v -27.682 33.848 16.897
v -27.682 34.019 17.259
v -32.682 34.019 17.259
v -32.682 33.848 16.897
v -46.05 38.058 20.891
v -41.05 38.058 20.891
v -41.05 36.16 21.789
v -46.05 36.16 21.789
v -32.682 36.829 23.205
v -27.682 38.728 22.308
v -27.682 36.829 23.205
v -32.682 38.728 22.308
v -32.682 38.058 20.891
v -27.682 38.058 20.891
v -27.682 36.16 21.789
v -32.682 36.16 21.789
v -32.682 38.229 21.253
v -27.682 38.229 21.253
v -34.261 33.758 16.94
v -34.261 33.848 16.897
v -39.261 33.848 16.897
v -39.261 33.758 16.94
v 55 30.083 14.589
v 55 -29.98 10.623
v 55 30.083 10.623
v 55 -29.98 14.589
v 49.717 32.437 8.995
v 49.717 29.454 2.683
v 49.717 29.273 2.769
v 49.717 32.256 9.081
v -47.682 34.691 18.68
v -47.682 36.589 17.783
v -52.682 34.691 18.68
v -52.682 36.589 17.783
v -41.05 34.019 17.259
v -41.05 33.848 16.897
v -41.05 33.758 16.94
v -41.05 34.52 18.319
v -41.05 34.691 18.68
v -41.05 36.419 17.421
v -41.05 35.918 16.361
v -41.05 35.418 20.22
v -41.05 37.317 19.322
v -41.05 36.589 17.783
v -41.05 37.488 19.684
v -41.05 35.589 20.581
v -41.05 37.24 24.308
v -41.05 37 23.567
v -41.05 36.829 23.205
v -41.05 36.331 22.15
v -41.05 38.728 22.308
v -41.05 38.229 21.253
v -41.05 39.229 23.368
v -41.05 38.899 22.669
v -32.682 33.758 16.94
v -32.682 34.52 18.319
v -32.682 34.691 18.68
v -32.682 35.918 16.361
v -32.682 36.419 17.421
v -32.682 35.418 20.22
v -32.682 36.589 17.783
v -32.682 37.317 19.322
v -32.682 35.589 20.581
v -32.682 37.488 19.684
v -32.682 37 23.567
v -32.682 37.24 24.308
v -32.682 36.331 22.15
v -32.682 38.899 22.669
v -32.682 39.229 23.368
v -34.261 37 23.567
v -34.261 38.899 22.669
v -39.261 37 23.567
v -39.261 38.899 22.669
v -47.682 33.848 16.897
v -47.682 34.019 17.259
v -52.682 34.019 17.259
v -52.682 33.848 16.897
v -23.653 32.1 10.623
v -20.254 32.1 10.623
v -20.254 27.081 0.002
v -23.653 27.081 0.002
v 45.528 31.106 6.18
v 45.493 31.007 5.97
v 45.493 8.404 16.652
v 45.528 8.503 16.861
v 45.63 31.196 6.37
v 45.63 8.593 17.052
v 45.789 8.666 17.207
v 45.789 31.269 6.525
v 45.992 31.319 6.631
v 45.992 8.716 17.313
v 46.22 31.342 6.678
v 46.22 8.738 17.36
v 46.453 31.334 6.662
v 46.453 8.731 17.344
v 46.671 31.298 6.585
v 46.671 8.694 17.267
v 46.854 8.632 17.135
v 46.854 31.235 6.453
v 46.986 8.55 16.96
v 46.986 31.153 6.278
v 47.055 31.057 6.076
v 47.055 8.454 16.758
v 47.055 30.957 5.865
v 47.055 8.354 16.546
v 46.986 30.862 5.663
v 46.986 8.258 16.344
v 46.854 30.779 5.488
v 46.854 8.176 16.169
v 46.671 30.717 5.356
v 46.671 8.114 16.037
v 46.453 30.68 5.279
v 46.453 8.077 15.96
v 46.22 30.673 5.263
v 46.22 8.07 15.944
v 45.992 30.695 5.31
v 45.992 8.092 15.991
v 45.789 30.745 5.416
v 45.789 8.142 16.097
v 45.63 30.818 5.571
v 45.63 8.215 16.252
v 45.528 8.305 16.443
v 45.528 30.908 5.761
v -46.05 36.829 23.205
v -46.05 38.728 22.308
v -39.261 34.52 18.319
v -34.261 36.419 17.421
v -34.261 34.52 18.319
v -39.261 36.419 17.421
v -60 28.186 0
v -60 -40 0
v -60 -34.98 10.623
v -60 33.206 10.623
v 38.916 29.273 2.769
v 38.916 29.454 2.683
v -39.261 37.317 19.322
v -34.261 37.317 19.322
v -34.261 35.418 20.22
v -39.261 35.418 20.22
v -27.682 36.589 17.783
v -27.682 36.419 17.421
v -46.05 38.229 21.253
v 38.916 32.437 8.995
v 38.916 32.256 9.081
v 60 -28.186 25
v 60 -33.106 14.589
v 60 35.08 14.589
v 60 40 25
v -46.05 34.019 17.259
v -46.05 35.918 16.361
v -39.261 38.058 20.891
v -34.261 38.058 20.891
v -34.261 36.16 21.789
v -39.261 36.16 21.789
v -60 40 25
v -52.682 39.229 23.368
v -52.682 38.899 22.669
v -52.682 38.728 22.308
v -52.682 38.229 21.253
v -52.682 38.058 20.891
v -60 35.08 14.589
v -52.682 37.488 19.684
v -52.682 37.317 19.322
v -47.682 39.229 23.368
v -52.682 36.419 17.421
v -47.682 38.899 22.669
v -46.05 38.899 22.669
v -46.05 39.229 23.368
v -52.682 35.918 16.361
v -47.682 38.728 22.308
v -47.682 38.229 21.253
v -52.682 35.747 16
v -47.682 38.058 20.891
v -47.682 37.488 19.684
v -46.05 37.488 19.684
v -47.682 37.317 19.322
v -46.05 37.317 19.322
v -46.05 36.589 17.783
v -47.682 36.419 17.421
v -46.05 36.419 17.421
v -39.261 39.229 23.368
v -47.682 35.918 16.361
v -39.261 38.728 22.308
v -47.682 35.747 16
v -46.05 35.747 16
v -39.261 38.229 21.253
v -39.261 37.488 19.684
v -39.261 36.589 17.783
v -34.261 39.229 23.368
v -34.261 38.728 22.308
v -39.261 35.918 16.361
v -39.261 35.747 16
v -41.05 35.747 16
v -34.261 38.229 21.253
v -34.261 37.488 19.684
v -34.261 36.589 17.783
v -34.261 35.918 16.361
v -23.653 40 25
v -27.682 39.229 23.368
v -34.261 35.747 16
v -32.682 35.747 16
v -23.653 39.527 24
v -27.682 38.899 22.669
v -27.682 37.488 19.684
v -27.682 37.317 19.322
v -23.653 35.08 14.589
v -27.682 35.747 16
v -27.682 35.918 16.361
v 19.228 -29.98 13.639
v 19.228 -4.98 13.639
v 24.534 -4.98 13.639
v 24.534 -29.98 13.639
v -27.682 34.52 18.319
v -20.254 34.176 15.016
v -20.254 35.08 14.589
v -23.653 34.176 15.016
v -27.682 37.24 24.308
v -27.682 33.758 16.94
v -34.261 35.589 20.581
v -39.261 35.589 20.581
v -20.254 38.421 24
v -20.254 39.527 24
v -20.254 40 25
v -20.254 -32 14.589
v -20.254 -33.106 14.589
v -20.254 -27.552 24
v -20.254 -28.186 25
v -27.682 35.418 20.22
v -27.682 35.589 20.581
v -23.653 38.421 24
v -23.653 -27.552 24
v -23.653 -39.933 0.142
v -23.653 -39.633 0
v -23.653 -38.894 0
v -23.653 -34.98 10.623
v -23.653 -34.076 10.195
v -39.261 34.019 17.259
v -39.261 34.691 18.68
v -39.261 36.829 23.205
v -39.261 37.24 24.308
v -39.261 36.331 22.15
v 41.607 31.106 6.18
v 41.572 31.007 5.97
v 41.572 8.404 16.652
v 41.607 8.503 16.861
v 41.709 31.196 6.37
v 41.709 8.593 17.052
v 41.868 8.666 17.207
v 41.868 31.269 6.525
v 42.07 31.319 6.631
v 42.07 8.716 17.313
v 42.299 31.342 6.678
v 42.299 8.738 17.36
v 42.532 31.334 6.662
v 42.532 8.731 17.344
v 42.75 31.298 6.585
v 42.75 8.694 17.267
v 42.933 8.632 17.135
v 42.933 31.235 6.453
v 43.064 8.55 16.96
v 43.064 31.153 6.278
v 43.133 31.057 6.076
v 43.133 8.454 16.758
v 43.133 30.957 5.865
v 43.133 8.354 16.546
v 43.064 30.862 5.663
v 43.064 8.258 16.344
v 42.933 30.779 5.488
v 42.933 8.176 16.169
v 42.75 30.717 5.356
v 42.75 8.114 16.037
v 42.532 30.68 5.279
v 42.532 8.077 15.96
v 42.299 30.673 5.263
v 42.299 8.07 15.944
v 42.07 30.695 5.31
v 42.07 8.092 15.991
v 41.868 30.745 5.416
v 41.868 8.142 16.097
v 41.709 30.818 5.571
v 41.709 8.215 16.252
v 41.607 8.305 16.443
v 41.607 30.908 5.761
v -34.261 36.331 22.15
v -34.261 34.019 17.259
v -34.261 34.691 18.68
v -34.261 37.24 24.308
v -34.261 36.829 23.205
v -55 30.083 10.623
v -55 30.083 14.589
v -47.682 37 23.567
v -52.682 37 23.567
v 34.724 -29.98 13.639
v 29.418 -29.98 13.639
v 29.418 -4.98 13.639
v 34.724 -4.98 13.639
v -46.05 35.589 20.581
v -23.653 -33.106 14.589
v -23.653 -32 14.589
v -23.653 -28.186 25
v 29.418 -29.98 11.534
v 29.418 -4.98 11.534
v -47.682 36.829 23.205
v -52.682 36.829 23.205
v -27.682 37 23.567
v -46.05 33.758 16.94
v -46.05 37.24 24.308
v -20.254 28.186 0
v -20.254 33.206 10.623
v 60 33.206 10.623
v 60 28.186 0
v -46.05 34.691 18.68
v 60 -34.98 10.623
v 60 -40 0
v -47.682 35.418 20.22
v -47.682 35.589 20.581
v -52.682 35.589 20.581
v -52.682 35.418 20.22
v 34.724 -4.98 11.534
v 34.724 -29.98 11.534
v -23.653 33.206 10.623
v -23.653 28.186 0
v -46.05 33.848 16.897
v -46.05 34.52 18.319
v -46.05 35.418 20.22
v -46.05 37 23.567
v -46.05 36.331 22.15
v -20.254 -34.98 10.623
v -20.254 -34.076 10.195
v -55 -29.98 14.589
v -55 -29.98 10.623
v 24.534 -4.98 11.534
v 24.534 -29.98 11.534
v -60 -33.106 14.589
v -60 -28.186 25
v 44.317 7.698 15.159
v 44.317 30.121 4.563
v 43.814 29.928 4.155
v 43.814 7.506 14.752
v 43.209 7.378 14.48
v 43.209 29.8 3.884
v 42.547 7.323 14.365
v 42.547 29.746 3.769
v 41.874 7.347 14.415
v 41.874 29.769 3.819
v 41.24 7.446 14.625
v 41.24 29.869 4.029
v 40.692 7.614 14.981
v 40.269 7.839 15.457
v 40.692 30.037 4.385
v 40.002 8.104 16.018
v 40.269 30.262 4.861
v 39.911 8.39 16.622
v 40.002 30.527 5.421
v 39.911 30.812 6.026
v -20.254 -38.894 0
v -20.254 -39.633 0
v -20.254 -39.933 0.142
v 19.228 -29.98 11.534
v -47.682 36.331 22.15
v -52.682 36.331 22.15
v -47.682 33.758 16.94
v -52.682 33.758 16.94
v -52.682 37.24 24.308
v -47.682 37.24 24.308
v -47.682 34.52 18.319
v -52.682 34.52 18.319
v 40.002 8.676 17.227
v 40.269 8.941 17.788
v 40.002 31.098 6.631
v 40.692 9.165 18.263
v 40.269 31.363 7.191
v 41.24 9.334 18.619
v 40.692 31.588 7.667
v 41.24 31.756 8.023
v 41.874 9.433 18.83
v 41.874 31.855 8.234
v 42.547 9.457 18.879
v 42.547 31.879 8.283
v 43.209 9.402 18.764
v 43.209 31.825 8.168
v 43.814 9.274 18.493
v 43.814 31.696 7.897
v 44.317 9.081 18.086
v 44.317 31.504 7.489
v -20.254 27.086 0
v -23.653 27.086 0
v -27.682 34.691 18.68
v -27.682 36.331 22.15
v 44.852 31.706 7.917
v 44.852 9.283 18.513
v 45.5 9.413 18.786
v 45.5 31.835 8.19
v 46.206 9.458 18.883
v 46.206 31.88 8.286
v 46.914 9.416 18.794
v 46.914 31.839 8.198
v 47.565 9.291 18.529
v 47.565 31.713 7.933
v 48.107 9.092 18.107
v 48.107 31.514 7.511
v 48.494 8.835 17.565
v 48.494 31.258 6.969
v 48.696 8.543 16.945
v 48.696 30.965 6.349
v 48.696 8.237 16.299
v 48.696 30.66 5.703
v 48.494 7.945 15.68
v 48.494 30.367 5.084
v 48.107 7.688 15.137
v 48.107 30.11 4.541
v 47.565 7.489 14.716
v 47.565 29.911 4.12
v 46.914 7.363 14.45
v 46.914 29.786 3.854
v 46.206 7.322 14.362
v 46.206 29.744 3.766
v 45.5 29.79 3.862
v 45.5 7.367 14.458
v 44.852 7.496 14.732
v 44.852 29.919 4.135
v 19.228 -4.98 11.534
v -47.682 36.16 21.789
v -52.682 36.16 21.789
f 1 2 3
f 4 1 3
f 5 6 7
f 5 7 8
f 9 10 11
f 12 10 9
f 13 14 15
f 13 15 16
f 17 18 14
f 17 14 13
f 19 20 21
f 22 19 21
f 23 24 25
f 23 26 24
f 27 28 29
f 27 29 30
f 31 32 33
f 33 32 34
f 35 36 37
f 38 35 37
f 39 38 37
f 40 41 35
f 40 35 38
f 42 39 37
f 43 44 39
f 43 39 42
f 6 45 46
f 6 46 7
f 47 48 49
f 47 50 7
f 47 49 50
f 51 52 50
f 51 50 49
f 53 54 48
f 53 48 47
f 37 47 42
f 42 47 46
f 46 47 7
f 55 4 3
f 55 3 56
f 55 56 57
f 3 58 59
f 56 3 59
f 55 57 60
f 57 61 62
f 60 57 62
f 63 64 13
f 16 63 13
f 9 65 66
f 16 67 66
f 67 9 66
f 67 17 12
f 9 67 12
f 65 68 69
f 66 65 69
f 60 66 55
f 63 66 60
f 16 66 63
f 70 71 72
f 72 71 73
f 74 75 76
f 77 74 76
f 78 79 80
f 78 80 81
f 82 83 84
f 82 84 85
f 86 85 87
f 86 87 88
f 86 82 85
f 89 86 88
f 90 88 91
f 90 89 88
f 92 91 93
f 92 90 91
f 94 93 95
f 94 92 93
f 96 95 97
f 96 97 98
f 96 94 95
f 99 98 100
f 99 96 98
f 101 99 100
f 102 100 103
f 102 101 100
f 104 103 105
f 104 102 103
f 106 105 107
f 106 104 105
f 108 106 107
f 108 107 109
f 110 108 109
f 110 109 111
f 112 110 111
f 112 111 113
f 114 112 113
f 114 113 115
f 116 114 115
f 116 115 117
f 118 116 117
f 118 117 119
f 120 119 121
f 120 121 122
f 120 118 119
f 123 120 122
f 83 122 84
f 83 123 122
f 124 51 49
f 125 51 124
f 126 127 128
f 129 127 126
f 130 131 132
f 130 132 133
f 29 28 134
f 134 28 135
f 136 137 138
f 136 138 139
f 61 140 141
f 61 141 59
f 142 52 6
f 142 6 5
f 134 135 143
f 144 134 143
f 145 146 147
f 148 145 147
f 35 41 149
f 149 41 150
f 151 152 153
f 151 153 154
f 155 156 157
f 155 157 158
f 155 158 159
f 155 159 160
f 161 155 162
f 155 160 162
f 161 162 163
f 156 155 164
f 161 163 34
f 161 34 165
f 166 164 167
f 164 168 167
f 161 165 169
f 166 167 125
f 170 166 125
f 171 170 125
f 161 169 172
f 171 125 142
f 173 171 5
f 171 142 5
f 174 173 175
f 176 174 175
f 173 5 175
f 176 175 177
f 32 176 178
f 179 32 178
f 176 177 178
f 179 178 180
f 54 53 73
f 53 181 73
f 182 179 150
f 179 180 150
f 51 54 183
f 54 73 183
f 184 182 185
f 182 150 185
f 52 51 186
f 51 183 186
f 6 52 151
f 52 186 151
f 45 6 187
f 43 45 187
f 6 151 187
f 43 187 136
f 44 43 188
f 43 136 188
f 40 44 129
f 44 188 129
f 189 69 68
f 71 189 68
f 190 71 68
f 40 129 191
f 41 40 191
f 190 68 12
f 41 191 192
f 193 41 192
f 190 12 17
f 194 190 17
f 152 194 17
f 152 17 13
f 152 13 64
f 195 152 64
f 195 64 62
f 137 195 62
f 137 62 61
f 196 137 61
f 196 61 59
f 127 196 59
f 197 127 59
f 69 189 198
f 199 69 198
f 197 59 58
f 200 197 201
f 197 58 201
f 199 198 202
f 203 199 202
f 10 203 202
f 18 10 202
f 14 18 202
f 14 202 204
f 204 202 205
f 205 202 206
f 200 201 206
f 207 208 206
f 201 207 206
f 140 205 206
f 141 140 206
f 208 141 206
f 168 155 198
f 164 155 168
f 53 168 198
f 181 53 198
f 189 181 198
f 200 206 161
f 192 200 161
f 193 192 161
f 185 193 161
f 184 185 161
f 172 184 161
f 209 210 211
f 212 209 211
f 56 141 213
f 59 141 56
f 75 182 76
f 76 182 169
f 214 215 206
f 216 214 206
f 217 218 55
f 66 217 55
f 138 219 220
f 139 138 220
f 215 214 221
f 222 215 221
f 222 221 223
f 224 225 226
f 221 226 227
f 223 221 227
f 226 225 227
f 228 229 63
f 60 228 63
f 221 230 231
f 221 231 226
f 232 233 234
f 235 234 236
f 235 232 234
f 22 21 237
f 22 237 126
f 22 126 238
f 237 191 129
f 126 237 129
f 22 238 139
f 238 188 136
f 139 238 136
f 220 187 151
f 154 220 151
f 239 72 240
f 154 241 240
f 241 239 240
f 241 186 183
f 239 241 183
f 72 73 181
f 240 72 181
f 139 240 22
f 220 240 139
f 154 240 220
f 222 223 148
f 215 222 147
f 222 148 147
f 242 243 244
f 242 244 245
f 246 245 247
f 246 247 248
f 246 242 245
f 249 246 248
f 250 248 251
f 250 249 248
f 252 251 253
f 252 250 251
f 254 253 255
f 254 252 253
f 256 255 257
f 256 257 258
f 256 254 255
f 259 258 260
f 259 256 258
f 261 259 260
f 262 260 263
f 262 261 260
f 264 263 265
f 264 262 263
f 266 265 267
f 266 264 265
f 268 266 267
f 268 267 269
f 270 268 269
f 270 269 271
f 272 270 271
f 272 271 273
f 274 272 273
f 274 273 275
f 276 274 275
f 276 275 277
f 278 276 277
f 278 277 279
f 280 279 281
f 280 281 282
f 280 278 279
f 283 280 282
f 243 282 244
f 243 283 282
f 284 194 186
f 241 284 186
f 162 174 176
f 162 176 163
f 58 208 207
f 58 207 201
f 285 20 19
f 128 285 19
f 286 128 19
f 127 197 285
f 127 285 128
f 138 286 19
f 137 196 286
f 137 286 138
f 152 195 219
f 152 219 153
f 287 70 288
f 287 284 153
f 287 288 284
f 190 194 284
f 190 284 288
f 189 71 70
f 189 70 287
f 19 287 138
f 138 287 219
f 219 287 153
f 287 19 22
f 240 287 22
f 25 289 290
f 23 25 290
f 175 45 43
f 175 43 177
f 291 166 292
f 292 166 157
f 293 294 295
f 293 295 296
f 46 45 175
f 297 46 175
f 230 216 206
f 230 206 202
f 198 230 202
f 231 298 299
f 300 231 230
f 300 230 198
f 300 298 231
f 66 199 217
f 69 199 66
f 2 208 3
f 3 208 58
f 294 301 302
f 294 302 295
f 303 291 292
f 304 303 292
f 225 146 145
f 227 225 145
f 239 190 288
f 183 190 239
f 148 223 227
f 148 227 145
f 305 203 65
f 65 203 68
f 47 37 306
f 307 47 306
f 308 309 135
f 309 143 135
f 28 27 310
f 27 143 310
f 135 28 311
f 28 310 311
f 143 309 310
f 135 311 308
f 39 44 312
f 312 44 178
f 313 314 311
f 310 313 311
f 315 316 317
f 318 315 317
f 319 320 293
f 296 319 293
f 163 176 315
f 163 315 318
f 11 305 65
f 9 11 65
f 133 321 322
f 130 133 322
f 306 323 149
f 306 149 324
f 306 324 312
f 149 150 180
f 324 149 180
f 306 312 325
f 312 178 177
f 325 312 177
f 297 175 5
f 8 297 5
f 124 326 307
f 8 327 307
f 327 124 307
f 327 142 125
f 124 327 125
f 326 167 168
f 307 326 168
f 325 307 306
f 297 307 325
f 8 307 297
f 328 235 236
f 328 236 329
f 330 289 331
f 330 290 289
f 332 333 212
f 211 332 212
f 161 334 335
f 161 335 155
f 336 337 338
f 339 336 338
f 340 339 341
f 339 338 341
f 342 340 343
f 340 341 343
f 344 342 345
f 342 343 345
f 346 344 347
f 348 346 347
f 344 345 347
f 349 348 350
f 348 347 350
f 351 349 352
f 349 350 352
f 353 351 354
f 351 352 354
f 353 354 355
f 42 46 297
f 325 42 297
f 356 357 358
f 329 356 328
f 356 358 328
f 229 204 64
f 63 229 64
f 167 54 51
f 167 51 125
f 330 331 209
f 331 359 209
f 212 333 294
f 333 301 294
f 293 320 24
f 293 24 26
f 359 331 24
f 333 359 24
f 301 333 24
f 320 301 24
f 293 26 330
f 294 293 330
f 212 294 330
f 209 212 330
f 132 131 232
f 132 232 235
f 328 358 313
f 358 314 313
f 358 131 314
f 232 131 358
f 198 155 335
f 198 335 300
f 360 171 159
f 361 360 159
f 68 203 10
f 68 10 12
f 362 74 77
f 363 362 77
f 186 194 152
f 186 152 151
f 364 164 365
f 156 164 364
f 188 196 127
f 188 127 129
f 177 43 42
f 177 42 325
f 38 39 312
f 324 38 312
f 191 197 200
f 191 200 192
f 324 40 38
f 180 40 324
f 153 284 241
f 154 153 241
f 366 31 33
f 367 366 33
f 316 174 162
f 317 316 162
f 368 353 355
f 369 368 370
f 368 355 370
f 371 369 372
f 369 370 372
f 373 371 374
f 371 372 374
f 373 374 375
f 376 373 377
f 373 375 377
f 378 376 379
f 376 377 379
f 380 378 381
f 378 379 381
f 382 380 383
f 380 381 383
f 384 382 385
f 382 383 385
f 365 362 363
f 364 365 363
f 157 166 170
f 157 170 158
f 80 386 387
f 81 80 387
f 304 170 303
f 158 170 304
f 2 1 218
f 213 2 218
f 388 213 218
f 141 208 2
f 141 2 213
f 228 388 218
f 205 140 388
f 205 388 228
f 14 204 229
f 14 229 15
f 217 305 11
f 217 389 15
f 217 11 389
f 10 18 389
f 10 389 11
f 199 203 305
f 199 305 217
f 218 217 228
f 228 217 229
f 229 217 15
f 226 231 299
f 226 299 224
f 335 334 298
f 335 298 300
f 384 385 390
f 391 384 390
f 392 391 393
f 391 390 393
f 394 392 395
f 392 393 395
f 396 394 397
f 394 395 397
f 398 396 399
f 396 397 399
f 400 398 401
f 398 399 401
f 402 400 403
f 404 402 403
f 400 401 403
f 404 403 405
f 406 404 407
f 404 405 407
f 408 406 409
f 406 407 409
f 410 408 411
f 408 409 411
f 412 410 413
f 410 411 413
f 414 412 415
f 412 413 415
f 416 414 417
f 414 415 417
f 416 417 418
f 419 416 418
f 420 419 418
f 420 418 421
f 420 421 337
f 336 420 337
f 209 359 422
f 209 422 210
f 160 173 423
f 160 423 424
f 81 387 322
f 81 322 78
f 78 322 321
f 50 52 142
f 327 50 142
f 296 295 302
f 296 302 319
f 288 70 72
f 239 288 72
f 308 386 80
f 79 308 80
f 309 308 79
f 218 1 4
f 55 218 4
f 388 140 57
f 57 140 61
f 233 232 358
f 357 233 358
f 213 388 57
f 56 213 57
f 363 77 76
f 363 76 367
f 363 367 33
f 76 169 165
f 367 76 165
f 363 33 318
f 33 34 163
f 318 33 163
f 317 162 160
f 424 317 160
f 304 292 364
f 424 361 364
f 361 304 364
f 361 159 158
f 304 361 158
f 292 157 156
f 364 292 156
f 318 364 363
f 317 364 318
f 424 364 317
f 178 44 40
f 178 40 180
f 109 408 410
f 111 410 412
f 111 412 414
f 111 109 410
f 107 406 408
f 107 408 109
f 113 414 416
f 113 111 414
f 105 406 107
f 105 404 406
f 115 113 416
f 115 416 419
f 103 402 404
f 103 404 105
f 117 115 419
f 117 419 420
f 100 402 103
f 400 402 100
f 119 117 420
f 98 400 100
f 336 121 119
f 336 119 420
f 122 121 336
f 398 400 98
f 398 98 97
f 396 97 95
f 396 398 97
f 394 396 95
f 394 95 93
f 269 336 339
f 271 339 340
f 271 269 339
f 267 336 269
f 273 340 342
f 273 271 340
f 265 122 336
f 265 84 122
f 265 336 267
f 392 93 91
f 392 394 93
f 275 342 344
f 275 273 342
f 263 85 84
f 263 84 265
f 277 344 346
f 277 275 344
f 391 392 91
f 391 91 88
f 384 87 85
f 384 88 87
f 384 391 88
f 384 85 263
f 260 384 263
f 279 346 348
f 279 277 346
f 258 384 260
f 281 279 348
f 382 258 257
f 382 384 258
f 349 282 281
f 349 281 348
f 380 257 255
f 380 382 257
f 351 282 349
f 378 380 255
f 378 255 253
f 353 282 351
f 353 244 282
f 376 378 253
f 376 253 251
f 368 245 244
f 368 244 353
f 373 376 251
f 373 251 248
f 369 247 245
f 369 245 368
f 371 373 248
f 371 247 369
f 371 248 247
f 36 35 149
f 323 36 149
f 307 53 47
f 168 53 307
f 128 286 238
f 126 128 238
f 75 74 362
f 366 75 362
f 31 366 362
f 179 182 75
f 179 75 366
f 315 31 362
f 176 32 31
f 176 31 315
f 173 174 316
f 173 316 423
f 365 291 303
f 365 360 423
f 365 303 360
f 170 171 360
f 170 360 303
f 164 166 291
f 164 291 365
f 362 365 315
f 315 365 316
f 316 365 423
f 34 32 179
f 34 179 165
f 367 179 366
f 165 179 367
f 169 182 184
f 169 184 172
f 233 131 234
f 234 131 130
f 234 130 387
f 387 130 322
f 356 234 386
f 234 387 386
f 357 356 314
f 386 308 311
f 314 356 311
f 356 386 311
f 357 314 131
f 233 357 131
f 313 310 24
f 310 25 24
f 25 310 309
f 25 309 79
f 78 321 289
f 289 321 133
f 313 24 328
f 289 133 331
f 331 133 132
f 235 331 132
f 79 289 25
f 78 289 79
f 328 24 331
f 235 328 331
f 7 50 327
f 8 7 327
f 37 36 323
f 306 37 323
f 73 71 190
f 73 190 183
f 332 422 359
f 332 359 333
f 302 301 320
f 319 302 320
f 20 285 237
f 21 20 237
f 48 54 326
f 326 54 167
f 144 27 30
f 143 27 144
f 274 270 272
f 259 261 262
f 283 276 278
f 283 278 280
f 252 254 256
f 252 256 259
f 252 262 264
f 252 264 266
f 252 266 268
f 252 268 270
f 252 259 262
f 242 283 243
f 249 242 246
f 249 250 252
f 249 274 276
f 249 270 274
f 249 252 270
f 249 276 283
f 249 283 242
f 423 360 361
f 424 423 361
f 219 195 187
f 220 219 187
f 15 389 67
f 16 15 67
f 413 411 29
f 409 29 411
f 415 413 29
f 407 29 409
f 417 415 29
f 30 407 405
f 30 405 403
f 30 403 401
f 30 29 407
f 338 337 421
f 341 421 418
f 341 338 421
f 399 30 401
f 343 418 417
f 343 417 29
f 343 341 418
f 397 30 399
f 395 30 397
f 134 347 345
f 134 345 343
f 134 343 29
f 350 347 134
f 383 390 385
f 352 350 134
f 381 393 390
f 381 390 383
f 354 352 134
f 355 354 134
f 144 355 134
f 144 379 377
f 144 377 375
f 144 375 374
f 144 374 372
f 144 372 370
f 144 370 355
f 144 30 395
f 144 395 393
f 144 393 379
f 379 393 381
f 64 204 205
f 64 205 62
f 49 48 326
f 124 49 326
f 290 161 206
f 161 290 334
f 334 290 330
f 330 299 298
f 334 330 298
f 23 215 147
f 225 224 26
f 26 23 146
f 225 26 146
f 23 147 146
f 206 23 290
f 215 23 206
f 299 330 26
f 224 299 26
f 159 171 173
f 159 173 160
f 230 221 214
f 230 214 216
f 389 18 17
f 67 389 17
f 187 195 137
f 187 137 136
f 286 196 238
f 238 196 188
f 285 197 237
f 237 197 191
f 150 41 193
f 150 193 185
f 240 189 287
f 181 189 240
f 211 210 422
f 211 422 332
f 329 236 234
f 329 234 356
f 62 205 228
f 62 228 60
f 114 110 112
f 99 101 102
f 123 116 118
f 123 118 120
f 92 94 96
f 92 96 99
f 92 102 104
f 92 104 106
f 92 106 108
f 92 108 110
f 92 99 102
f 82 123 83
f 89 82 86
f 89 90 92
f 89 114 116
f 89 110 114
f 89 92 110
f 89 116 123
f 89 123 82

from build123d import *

# Parameters (mm, degrees)
F0_W      = 120
F0_H      = 80
F1_DEPTH  = 25
F3_DEPTH  = 120.001
F5_DEPTH  = 120.001
F7_DEPTH  = 5
F9_DEPTH  = 150
F11_DEPTH = 5
F13_DEPTH = 170
F14_W     = 3.3992808312
F14_H     = 11.5154450741
F14_H_2   = 11.5925325081
F15_DEPTH = 1
F16_W     = 3.3992808312
F16_H     = 68.1857028604
F17_DEPTH = 1
F18_W     = 3.3992808312
F18_H     = 10.4094055069
F18_H_2   = 12.2191561386
F19_DEPTH = 1
F20_W     = 5.3057130426
F20_H     = 2.1054418758
F20_W_2   = 5.30571118
F21_DEPTH = 25
F24_DEPTH = 25
F23_R     = 0.785
F25_DEPTH = 25
F26_W     = 10.8015254887
F26_H     = 6.9811940193
F27_DEPTH = 0.2
F28_W     = 5
F28_H     = 8.15
F29_DEPTH = 2.2
F30_W     = 5
F30_H     = 0.4
F31_DEPTH = 2.1


with BuildPart() as f1:
    # F0 (on Top) → F1 (new body)
    with BuildSketch(Plane.XY):
        Rectangle(F0_W, F0_H)
    extrude(amount=F1_DEPTH)

    # F2 (on face) → F3 (cut, through all)
    with BuildSketch(Plane.YZ.offset(60)):
        Polygon((-40, 0), (-28.1857028604, 25), (-40, 25), align=None)
    extrude(amount=-F3_DEPTH, mode=Mode.SUBTRACT)

    # F4 (on face) → F5 (cut, through all)
    with BuildSketch(Plane.YZ.offset(60)):
        Polygon((40, 0), (40, 25), (28.1857009977, 0), align=None)
    extrude(amount=-F5_DEPTH, mode=Mode.SUBTRACT)

    # F6 (on face) → F7 (cut)
    with BuildSketch(Plane.YZ.offset(60)):
        Polygon((35.0798550639, 14.5885804668), (-33.1058470208, 14.5885804668), (-34.9799869852, 10.6227500364), (33.205714804, 10.6227500364), align=None)
    extrude(amount=-F7_DEPTH, mode=Mode.SUBTRACT)

    # F8 (on face) → F9 (cut)
    with BuildSketch(Plane.YZ.offset(55)):
        Polygon((-33.1058470208, 14.5885804668), (-34.9799869852, 10.6227500364), (-29.9799869852, 10.6227500364), (-29.9799869852, 14.5885804668), align=None)
    extrude(amount=-F9_DEPTH, mode=Mode.SUBTRACT)

    # F10 (on face) → F11 (cut)
    with BuildSketch(Plane(origin=(-60, 0, 0), x_dir=(0, -1, 0), z_dir=(-1, 0, 0))):
        Polygon((29.9799869852, 10.6227500364), (29.9799869852, 14.5885804668), (-35.0798550639, 14.5885804668), (-33.205714804, 10.6227500364), align=None)
    extrude(amount=-F11_DEPTH, mode=Mode.SUBTRACT)

    # F12 (on face) → F13 (cut)
    with BuildSketch(Plane(origin=(-55, 0, 0), x_dir=(0, -1, 0), z_dir=(-1, 0, 0))):
        Polygon((-30.0832055509, 14.5885804668), (-35.0798550639, 14.5885804668), (-33.205714804, 10.6227500364), (-30.0832055509, 10.6227500364), align=None)
    extrude(amount=-F13_DEPTH, mode=Mode.SUBTRACT)

    # F14 (on face) → F15 (cut)
    with BuildSketch(Plane(origin=(0, -32.6977921499, 15.4520572908), x_dir=(1, 0, 0), z_dir=(0, -0.9041265419, 0.4272647847))):
        with Locations((-21.9536880031, 4.8026827457)):
            Rectangle(F14_W, F14_H)
        with Locations((-21.9536880031, -11.1376703717)):
            Rectangle(F14_W, F14_H_2)
    extrude(amount=-F15_DEPTH, mode=Mode.SUBTRACT)

    # F16 (on face) → F17 (cut)
    with BuildSketch(Plane.XY.offset(25)):
        with Locations((-21.9536880031, 5.9071485698)):
            Rectangle(F16_W, F16_H)
    extrude(amount=-F17_DEPTH, mode=Mode.SUBTRACT)

    # F18 (on face) → F19 (cut)
    with BuildSketch(Plane(origin=(0, 23.0402534943, -10.8881777548), x_dir=(-1, 0, 0), z_dir=(0, 0.9041265159, -0.4272648398))):
        with Locations((21.9536880031, 33.3830138355)):
            Rectangle(F18_W, F18_H)
        with Locations((21.9536880031, 17.6823684014)):
            Rectangle(F18_W, F18_H_2)
    extrude(amount=-F19_DEPTH, mode=Mode.SUBTRACT)

    # F20 (on face) → F21 (cut)
    with BuildSketch(Plane.XZ.offset(29.9799869852)):
        with Locations((21.8807244673, 12.5863919966)):
            Rectangle(F20_W, F20_H)
        with Locations((32.071063295, 12.5863919966)):
            Rectangle(F20_W_2, F20_H)
    extrude(amount=-F21_DEPTH, mode=Mode.SUBTRACT)

    # F22 (on face) → F24 (cut)
    with BuildSketch(Plane(origin=(0, 23.0402534943, -10.8881777548), x_dir=(-1, 0, 0), z_dir=(0, 0.9041265159, -0.4272648398))):
        with BuildLine():
            ThreePointArc((-44.3166374787, 16.9950310891), (-43.875457386, 17.751342396), (-43.7221280526, 18.6133962125))
            ThreePointArc((-43.7221280526, 18.6133962125), (-43.875457386, 19.4754500289), (-44.3166374787, 20.2317613358))
            ThreePointArc((-44.3166374787, 20.2317613358), (-44.9111469047, 18.6133962125), (-44.3166374787, 16.9950310891))
        make_face()
        with BuildLine():
            ThreePointArc((-44.3166374787, 16.9950310891), (-44.9111469047, 18.6133962125), (-44.3166374787, 20.2317613358))
            ThreePointArc((-44.3166374787, 20.2317613358), (-48.7221280526, 18.6133962125), (-44.3166374787, 16.9950310891))
        make_face()
        with BuildLine():
            ThreePointArc((-44.3166374787, 20.2317613358), (-43.875457386, 19.4754500289), (-43.7221280526, 18.6133962125))
            ThreePointArc((-43.7221280526, 18.6133962125), (-43.875457386, 17.751342396), (-44.3166374787, 16.9950310891))
            ThreePointArc((-44.3166374787, 16.9950310891), (-41.5490930882, 16.2667255459), (-39.9111469047, 18.6133962125))
            ThreePointArc((-39.9111469047, 18.6133962125), (-41.5490930882, 20.9600668791), (-44.3166374787, 20.2317613358))
        make_face()
    extrude(amount=-F24_DEPTH, mode=Mode.SUBTRACT)

    # F23 (on face) → F25 (join)
    with BuildSketch(Plane(origin=(0, 23.0402534943, -10.8881777548), x_dir=(-1, 0, 0), z_dir=(0, 0.9041265159, -0.4272648398))):
        with Locations((-42.3572132297, 18.6463277787)):
            Circle(F23_R)
        with Locations((-46.2783562048, 18.6463277787)):
            Circle(F23_R)
    extrude(amount=-F25_DEPTH)

    # F26 (on face) → F27 (cut)
    with BuildSketch(Plane(origin=(0, 23.0402534943, -10.8881777548), x_dir=(-1, 0, 0), z_dir=(0, 0.9041265159, -0.4272648398))):
        with Locations((-44.3166374787, 18.5013003647)):
            Rectangle(F26_W, F26_H)
        with BuildLine():
            ThreePointArc((-44.3166374787, 16.9950310891), (-48.7221280526, 18.6133962125), (-44.3166374787, 20.2317613358))
            ThreePointArc((-44.3166374787, 20.2317613358), (-39.9111469047, 18.6133962125), (-44.3166374787, 16.9950310891))
        make_face(mode=Mode.SUBTRACT)
    extrude(amount=-F27_DEPTH, mode=Mode.SUBTRACT)

    # F28 (on face) → F29 (cut)
    with BuildSketch(Plane(origin=(0, 23.0402534943, -10.8881777548), x_dir=(-1, 0, 0), z_dir=(0, 0.9041265159, -0.4272648398))):
        with Locations((50.181994272, 33.814091168)):
            Rectangle(F28_W, F28_H)
        with Locations((43.5504163067, 33.814091168)):
            Rectangle(F28_W, F28_H)
        with Locations((36.7609430726, 33.814091168)):
            Rectangle(F28_W, F28_H)
        with Locations((30.1819981592, 33.814091168)):
            Rectangle(F28_W, F28_H)
    extrude(amount=-F29_DEPTH, mode=Mode.SUBTRACT)

    # F30 (on face) → F31 (join)
    with BuildSketch(Plane(origin=(0, 23.0402534943, -10.8881777548), x_dir=(-1, 0, 0), z_dir=(0, 0.9041265159, -0.4272648398))):
        with Locations((50.181994272, 36.916055125)):
            Rectangle(F30_W, F30_H)
        with Locations((43.5504163067, 36.916055125)):
            Rectangle(F30_W, F30_H)
        with Locations((50.181994272, 35.3494960487)):
            Rectangle(F30_W, F30_H)
        with Locations((43.5504163067, 35.3494960487)):
            Rectangle(F30_W, F30_H)
        with Locations((43.5504163067, 33.614091168)):
            Rectangle(F30_W, F30_H)
        with Locations((50.181994272, 33.614091168)):
            Rectangle(F30_W, F30_H)
        with Locations((50.181994272, 31.5114263117)):
            Rectangle(F30_W, F30_H)
        with Locations((43.5504163067, 31.5114263117)):
            Rectangle(F30_W, F30_H)
        with Locations((43.5504163067, 29.939091168)):
            Rectangle(F30_W, F30_H)
        with Locations((50.181994272, 29.939091168)):
            Rectangle(F30_W, F30_H)
        with Locations((30.1819981592, 36.916055125)):
            Rectangle(F30_W, F30_H)
        with Locations((36.7609430726, 36.916055125)):
            Rectangle(F30_W, F30_H)
        with Locations((36.7609430726, 35.3494960487)):
            Rectangle(F30_W, F30_H)
        with Locations((30.1819981592, 35.3494960487)):
            Rectangle(F30_W, F30_H)
        with Locations((30.1819981592, 33.614091168)):
            Rectangle(F30_W, F30_H)
        with Locations((36.7609430726, 33.614091168)):
            Rectangle(F30_W, F30_H)
        with Locations((30.1819981592, 31.5114263117)):
            Rectangle(F30_W, F30_H)
        with Locations((36.7609430726, 31.5114263117)):
            Rectangle(F30_W, F30_H)
        with Locations((30.1819981592, 29.939091168)):
            Rectangle(F30_W, F30_H)
        with Locations((36.7609430726, 29.939091168)):
            Rectangle(F30_W, F30_H)
    extrude(amount=-F31_DEPTH)


solid = f1.part
